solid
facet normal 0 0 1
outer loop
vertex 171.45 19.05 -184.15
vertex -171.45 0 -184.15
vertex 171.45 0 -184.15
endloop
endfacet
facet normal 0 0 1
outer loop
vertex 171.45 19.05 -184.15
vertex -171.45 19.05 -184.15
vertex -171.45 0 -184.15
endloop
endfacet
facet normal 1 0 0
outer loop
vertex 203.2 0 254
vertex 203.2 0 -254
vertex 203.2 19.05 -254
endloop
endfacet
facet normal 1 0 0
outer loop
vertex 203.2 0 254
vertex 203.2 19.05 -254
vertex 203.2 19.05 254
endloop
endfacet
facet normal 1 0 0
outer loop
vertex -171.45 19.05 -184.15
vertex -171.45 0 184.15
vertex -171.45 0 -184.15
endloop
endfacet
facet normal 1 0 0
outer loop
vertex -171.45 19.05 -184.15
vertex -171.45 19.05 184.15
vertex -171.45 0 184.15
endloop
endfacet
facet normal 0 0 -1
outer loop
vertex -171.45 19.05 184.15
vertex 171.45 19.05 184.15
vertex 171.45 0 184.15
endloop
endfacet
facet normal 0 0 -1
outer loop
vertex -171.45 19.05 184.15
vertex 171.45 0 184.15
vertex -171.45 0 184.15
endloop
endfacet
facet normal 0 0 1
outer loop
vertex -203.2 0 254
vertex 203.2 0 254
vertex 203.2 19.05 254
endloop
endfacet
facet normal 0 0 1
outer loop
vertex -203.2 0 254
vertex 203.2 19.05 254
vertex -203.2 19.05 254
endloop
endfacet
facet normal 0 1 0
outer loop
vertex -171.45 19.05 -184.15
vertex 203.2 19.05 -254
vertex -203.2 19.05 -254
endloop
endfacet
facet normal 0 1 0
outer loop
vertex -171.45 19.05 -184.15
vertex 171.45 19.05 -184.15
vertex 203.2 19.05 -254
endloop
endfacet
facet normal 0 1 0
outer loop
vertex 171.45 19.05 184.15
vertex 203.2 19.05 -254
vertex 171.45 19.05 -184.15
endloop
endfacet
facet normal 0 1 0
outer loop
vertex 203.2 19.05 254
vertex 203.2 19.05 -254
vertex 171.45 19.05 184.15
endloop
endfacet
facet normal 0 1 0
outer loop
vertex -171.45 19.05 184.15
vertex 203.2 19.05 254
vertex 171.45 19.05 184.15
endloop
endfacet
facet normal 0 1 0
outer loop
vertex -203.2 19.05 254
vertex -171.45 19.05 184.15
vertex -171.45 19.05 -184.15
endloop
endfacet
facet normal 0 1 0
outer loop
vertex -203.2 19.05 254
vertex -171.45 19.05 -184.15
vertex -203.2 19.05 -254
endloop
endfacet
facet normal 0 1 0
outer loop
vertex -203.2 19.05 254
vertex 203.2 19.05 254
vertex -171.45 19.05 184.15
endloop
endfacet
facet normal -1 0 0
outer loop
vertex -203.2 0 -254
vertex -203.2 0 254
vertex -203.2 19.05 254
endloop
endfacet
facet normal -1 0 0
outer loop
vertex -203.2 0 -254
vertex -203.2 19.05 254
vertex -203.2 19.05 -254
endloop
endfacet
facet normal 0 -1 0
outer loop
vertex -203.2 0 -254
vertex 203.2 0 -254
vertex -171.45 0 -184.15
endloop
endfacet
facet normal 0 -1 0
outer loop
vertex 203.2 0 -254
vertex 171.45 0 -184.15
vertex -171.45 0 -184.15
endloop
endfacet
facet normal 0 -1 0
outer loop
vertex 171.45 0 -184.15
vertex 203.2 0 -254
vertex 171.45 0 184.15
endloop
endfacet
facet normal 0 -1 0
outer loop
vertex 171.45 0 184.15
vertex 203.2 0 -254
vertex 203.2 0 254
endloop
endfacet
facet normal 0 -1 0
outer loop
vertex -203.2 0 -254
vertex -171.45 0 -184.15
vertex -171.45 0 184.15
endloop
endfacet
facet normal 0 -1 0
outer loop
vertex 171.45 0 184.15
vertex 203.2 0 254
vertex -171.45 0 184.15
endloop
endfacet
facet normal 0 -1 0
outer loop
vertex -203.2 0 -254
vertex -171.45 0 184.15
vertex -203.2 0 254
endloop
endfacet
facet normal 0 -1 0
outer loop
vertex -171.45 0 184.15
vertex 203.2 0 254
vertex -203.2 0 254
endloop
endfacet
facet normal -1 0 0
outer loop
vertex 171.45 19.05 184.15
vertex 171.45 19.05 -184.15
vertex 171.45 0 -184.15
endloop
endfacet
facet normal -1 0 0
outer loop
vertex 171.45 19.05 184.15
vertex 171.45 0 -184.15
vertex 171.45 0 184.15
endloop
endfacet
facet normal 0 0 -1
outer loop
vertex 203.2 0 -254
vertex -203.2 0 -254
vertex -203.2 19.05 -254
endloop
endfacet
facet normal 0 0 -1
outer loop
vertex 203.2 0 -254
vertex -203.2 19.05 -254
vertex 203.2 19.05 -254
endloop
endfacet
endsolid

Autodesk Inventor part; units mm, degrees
ref_plane "YZ Plane" through (0, 0, 0) normal (1, 0, 0) x (0, 1, 0)
ref_plane "XZ Plane" through (0, 0, 0) normal (0, 1, 0) x (-1, 0, 0)
ref_plane "XY Plane" through (0, 0, 0) normal (0, 0, 1) x (1, 0, 0)
sketch "Sketch1" plane through (0, 0, 0) normal (0, 1, 0) x (-1, 0, 0)
  line L0 (-203.2, 254) -> (203.2, 254)
  line L1 (203.2, 254) -> (203.2, -254)
  line L2 (203.2, -254) -> (-203.2, -254)
  line L3 (-203.2, -254) -> (-203.2, 254)
  line L4 (-203.2, 254) -> (203.2, -254) construction
  line L5 (203.2, 254) -> (-203.2, -254) construction
  point P0 (0, 0)
  dimension "d0" = 508
  dimension "d1" = 406.4
extrude "Extrusion1" add sketch "Sketch1" along normal blind 19.05
sketch "Sketch2" plane through (0, 19.05, 0) normal (0, 1, 0) x (1, 0, 0)
  line L0 (171.45, -184.15) -> (-171.45, -184.15)
  line L1 (-171.45, -184.15) -> (-171.45, 184.15)
  line L2 (-171.45, 184.15) -> (171.45, 184.15)
  line L3 (171.45, 184.15) -> (171.45, -184.15)
  line L4 (171.45, -184.15) -> (-171.45, 184.15) construction
  line L5 (-171.45, -184.15) -> (171.45, 184.15) construction
  point P0 (0, 0)
  dimension "d4" = 368.3
  dimension "d5" = 342.9
extrude "Extrusion2" cut sketch "Sketch2" against normal blind 25.4
properties part number "monitor frame part1 (for assembly)"
